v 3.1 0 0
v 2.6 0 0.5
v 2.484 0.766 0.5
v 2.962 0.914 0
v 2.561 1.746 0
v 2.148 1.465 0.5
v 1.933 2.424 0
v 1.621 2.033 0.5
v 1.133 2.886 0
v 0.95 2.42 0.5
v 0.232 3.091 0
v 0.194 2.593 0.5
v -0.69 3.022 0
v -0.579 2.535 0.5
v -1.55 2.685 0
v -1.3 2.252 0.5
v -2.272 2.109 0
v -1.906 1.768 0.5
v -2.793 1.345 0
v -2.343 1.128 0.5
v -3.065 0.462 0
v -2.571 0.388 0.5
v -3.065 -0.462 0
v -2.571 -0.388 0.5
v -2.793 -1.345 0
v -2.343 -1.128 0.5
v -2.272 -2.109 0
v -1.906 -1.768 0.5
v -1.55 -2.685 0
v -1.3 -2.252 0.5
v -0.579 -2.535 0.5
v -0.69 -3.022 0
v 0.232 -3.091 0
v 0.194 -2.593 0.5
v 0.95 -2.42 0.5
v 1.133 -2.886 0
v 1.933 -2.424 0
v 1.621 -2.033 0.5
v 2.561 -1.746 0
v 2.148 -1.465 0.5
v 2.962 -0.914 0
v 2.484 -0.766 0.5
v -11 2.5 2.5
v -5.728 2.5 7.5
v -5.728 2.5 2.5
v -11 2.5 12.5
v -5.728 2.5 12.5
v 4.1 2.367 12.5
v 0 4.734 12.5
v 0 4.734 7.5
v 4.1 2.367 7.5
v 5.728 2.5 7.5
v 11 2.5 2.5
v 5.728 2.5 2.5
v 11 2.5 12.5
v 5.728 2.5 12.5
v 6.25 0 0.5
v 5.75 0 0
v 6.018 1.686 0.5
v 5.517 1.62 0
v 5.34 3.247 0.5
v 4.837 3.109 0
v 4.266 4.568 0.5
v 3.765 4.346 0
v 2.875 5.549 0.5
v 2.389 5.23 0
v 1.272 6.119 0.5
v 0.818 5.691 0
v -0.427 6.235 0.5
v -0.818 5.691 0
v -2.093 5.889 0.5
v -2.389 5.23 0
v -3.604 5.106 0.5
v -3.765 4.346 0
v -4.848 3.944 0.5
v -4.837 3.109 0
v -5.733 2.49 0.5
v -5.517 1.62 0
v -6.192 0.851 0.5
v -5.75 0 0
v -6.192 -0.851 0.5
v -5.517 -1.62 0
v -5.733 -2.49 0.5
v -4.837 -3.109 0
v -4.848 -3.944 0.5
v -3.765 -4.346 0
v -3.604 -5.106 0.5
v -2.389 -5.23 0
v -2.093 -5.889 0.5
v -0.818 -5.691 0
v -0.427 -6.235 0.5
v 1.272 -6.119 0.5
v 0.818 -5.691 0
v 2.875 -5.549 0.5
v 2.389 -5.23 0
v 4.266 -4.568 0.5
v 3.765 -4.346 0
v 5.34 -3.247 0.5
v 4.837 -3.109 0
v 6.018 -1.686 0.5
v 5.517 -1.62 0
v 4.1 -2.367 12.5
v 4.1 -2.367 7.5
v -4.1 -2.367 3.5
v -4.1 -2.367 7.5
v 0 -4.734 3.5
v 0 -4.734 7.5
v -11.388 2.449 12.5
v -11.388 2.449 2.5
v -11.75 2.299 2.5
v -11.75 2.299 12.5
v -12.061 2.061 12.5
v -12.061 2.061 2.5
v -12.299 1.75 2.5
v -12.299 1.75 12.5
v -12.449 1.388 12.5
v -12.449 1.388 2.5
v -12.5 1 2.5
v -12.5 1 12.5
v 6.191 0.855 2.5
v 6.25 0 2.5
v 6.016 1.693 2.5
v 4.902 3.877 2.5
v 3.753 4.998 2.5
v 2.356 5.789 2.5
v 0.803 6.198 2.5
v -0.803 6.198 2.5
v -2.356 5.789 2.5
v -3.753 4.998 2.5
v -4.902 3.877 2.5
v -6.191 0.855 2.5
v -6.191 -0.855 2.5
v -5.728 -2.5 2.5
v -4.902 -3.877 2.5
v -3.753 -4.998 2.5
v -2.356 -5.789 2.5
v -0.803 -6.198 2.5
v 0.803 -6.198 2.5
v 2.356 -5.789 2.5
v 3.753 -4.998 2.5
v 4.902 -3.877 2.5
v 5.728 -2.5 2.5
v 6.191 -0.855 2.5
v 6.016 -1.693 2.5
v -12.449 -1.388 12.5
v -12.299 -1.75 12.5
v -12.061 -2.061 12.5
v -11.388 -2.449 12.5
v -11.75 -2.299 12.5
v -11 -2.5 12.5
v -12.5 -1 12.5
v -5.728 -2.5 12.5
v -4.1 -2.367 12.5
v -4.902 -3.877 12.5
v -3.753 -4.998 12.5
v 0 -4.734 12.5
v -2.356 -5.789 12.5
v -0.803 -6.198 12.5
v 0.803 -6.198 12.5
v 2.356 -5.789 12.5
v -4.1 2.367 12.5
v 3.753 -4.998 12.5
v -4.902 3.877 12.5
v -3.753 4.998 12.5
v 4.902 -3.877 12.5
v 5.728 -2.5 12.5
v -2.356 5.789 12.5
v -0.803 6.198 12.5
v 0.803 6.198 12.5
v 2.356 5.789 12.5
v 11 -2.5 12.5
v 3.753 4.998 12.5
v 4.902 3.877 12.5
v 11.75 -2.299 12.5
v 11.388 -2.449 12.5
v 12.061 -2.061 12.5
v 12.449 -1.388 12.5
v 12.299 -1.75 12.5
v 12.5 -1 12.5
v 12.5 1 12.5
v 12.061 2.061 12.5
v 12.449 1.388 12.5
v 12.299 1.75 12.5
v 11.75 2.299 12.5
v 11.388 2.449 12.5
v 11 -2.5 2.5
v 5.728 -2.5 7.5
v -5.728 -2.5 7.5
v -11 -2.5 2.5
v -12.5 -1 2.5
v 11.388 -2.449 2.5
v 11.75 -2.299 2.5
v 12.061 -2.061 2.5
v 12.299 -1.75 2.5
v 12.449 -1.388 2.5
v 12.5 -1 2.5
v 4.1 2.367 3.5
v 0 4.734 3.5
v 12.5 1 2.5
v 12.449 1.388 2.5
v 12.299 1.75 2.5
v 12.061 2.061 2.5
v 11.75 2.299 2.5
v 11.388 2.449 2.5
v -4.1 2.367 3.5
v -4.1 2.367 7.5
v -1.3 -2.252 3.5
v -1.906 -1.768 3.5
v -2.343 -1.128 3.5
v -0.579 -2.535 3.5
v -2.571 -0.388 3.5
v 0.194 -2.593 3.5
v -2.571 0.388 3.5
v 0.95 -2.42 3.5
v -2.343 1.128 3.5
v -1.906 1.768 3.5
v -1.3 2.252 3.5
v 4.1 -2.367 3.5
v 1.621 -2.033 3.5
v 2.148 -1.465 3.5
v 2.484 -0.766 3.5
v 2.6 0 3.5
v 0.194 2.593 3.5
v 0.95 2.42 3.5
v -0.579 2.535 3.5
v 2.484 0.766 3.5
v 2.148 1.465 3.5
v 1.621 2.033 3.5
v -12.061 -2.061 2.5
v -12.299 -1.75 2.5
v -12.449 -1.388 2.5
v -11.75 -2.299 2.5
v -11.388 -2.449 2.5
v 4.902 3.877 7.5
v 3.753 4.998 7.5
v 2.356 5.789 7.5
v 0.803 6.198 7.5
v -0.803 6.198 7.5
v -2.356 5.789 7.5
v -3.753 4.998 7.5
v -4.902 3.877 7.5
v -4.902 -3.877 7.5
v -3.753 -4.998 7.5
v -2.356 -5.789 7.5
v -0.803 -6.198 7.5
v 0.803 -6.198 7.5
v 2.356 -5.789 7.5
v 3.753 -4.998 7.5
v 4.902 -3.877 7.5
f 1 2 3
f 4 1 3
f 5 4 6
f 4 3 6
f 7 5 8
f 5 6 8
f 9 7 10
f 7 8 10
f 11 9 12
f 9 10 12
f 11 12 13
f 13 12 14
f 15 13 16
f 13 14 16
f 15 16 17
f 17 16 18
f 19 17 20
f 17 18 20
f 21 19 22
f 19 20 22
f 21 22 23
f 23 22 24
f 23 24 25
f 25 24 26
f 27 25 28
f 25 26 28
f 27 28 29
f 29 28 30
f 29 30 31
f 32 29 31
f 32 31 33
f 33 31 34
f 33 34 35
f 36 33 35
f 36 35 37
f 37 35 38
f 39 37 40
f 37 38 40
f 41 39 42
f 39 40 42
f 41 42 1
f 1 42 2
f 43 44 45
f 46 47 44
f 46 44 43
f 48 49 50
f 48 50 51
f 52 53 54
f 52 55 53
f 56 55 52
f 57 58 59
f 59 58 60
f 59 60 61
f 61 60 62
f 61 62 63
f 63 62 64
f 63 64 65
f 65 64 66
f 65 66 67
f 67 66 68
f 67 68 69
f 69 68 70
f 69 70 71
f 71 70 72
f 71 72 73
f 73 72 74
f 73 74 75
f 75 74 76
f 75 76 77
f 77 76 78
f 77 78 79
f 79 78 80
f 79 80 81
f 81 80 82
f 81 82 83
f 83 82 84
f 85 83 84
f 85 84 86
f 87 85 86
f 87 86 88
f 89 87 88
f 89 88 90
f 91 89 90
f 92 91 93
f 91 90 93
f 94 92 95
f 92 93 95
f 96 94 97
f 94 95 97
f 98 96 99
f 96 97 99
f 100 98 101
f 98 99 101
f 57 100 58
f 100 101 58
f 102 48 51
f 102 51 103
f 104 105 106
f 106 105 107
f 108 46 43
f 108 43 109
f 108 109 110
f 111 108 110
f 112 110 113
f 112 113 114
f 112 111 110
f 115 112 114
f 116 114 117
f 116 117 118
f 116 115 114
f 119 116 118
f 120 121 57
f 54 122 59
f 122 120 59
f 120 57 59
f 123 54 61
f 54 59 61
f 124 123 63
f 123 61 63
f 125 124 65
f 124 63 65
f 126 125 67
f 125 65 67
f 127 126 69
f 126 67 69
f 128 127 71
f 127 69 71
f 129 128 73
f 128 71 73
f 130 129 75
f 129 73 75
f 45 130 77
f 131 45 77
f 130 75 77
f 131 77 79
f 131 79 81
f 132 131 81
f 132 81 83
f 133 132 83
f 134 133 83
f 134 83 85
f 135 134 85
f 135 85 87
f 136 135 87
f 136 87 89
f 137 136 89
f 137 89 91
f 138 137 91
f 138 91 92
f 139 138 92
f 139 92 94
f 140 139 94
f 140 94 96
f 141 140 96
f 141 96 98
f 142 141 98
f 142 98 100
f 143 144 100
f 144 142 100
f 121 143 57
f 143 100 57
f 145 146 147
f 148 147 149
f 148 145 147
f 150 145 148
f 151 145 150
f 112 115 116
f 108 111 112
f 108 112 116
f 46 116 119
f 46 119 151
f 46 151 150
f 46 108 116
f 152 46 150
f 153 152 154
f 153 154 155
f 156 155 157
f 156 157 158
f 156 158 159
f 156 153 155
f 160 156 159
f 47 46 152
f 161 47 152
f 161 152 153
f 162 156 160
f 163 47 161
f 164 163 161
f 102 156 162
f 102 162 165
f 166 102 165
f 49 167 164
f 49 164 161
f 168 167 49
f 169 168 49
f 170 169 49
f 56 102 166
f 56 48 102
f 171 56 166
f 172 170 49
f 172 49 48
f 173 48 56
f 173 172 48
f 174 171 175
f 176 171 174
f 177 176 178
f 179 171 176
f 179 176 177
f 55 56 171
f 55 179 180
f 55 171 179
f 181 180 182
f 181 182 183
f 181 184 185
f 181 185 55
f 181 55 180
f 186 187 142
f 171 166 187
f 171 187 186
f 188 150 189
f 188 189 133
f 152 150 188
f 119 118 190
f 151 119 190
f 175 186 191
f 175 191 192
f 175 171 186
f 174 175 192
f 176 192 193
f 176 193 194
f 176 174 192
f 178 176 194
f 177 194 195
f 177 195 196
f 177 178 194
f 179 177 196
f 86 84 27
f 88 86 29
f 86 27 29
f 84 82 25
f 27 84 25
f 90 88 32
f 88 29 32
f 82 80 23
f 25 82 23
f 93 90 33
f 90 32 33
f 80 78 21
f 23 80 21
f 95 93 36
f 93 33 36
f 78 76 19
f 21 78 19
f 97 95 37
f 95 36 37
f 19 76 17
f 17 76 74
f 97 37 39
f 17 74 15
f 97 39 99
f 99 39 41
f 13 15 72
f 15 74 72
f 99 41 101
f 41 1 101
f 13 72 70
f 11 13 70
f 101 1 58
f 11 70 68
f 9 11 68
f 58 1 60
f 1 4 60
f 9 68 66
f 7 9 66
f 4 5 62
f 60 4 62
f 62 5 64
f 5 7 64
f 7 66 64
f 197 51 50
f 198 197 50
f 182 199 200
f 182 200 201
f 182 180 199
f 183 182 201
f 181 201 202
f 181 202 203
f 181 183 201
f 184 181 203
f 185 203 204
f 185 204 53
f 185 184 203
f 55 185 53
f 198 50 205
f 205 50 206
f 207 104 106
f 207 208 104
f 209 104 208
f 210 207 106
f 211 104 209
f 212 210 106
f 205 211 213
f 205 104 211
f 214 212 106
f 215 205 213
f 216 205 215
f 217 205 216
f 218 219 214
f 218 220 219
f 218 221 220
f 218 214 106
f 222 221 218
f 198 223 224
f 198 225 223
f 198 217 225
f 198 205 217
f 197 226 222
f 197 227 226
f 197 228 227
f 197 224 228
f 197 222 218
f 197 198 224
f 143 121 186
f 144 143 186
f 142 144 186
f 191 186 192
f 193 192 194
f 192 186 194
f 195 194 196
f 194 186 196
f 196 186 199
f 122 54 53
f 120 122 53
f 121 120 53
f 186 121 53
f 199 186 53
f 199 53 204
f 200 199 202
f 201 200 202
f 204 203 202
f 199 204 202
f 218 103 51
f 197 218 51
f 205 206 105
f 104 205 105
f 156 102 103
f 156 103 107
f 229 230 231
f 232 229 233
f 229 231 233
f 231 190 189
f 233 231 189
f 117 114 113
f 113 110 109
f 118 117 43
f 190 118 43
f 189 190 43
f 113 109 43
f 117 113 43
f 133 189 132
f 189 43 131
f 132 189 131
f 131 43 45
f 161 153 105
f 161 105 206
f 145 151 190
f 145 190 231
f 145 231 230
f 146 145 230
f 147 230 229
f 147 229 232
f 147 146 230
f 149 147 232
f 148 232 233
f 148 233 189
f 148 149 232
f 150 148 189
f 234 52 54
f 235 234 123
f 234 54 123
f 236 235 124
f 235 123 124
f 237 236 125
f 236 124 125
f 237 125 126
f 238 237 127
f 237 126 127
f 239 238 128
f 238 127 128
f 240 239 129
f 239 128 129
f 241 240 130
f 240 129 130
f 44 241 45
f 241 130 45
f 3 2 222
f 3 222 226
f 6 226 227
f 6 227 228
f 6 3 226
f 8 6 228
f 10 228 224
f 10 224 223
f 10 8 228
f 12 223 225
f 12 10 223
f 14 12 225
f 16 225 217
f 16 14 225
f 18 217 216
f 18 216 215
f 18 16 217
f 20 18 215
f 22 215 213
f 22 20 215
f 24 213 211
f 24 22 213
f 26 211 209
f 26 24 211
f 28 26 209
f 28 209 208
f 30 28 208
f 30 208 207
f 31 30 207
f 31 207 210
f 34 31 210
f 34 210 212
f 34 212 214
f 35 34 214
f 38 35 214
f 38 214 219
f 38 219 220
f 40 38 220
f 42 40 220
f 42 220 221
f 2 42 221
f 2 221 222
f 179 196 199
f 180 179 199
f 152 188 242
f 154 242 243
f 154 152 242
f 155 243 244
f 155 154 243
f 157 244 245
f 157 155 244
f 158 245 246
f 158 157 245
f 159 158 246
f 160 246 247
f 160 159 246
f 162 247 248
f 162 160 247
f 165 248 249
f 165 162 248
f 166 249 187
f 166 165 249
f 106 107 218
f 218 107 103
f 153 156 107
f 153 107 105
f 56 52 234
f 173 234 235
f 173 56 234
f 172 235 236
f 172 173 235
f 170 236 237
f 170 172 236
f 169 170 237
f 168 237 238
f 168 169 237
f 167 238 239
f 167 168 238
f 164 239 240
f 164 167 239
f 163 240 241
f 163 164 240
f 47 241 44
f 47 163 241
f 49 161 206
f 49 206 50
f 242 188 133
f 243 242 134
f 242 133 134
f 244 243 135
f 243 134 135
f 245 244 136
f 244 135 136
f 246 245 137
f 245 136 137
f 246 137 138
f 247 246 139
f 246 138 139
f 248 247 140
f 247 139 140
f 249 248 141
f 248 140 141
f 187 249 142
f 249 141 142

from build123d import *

# Parameters (mm, degrees)
F0_R     = 6.25
F0_R_2   = 2.6
F1_DEPTH = 7.5
F3_DEPTH = 5
F4_SIZE  = 0.5
F5_R     = 2.6
F6_DEPTH = 4


# Not quite as in the source:
# - a feature names something its author has since deleted; it is built from what else it names


with BuildPart() as f1:
    # F0 (on Top) → F1 (new body)
    with BuildSketch(Plane.XY):
        Circle(F0_R)
        Circle(F0_R_2, mode=Mode.SUBTRACT)
    extrude(amount=F1_DEPTH)

    # F2 (on face) → F3 (join, symmetric)
    with BuildSketch(Plane.XY.offset(7.5)):
        with BuildLine():
            Line((11, 2.5), (5.7282196187, 2.5))
            ThreePointArc((5.7282196187, 2.5), (6.1181644558, 1.2769352731), (6.25, 0))
            ThreePointArc((6.25, 0), (6.1181644558, -1.2769352731), (5.7282196187, -2.5))
            Line((5.7282196187, -2.5), (11, -2.5))
            ThreePointArc((11, -2.5), (12.0606601718, -2.0606601718), (12.5, -1))
            Line((12.5, -1), (12.5, 1))
            ThreePointArc((12.5, 1), (12.0606601718, 2.0606601718), (11, 2.5))
        make_face()
        with BuildLine():
            ThreePointArc((-5.7282196187, -2.5), (-6.25, 0), (-5.7282196187, 2.5))
            Line((-5.7282196187, 2.5), (-11, 2.5))
            ThreePointArc((-11, 2.5), (-12.0606601718, 2.0606601718), (-12.5, 1))
            Line((-12.5, 1), (-12.5, -1))
            ThreePointArc((-12.5, -1), (-12.0606601718, -2.0606601718), (-11, -2.5))
            Line((-11, -2.5), (-5.7282196187, -2.5))
        make_face()
        with BuildLine():
            ThreePointArc((6.25, 0), (6.1181644558, 1.2769352731), (5.7282196187, 2.5))
            ThreePointArc((5.7282196187, 2.5), (0, 6.25), (-5.7282196187, 2.5))
            ThreePointArc((-5.7282196187, 2.5), (-6.25, 0), (-5.7282196187, -2.5))
            ThreePointArc((-5.7282196187, -2.5), (0, -6.25), (5.7282196187, -2.5))
            ThreePointArc((5.7282196187, -2.5), (6.1181644558, -1.2769352731), (6.25, 0))
        make_face()
        Polygon((-4.1, 2.3671361037), (0, 4.7342722074), (4.1, 2.3671361037), (4.1, -2.3671361037), (0, -4.7342722074), (-4.1, -2.3671361037), align=None, mode=Mode.SUBTRACT)
    extrude(amount=F3_DEPTH, both=True)

    # F4
    f4_edges = [f1.edges().sort_by_distance(p)[0] for p in [
        (-6.25, 0, 0),
        (-2.6, 0, 0),
    ]]
    chamfer(f4_edges, length=F4_SIZE)

    # F5 (on face) → F6 (cut)
    with BuildSketch(Plane.XY.offset(7.5)):
        Polygon((4.1, -2.3671361037), (4.1, 2.3671361037), (0, 4.7342722074), (-4.1, 2.3671361037), (-4.1, -2.3671361037), (0, -4.7342722074), align=None)
        Circle(F5_R, mode=Mode.SUBTRACT)
    extrude(amount=-F6_DEPTH, mode=Mode.SUBTRACT)


solid = f1.part
